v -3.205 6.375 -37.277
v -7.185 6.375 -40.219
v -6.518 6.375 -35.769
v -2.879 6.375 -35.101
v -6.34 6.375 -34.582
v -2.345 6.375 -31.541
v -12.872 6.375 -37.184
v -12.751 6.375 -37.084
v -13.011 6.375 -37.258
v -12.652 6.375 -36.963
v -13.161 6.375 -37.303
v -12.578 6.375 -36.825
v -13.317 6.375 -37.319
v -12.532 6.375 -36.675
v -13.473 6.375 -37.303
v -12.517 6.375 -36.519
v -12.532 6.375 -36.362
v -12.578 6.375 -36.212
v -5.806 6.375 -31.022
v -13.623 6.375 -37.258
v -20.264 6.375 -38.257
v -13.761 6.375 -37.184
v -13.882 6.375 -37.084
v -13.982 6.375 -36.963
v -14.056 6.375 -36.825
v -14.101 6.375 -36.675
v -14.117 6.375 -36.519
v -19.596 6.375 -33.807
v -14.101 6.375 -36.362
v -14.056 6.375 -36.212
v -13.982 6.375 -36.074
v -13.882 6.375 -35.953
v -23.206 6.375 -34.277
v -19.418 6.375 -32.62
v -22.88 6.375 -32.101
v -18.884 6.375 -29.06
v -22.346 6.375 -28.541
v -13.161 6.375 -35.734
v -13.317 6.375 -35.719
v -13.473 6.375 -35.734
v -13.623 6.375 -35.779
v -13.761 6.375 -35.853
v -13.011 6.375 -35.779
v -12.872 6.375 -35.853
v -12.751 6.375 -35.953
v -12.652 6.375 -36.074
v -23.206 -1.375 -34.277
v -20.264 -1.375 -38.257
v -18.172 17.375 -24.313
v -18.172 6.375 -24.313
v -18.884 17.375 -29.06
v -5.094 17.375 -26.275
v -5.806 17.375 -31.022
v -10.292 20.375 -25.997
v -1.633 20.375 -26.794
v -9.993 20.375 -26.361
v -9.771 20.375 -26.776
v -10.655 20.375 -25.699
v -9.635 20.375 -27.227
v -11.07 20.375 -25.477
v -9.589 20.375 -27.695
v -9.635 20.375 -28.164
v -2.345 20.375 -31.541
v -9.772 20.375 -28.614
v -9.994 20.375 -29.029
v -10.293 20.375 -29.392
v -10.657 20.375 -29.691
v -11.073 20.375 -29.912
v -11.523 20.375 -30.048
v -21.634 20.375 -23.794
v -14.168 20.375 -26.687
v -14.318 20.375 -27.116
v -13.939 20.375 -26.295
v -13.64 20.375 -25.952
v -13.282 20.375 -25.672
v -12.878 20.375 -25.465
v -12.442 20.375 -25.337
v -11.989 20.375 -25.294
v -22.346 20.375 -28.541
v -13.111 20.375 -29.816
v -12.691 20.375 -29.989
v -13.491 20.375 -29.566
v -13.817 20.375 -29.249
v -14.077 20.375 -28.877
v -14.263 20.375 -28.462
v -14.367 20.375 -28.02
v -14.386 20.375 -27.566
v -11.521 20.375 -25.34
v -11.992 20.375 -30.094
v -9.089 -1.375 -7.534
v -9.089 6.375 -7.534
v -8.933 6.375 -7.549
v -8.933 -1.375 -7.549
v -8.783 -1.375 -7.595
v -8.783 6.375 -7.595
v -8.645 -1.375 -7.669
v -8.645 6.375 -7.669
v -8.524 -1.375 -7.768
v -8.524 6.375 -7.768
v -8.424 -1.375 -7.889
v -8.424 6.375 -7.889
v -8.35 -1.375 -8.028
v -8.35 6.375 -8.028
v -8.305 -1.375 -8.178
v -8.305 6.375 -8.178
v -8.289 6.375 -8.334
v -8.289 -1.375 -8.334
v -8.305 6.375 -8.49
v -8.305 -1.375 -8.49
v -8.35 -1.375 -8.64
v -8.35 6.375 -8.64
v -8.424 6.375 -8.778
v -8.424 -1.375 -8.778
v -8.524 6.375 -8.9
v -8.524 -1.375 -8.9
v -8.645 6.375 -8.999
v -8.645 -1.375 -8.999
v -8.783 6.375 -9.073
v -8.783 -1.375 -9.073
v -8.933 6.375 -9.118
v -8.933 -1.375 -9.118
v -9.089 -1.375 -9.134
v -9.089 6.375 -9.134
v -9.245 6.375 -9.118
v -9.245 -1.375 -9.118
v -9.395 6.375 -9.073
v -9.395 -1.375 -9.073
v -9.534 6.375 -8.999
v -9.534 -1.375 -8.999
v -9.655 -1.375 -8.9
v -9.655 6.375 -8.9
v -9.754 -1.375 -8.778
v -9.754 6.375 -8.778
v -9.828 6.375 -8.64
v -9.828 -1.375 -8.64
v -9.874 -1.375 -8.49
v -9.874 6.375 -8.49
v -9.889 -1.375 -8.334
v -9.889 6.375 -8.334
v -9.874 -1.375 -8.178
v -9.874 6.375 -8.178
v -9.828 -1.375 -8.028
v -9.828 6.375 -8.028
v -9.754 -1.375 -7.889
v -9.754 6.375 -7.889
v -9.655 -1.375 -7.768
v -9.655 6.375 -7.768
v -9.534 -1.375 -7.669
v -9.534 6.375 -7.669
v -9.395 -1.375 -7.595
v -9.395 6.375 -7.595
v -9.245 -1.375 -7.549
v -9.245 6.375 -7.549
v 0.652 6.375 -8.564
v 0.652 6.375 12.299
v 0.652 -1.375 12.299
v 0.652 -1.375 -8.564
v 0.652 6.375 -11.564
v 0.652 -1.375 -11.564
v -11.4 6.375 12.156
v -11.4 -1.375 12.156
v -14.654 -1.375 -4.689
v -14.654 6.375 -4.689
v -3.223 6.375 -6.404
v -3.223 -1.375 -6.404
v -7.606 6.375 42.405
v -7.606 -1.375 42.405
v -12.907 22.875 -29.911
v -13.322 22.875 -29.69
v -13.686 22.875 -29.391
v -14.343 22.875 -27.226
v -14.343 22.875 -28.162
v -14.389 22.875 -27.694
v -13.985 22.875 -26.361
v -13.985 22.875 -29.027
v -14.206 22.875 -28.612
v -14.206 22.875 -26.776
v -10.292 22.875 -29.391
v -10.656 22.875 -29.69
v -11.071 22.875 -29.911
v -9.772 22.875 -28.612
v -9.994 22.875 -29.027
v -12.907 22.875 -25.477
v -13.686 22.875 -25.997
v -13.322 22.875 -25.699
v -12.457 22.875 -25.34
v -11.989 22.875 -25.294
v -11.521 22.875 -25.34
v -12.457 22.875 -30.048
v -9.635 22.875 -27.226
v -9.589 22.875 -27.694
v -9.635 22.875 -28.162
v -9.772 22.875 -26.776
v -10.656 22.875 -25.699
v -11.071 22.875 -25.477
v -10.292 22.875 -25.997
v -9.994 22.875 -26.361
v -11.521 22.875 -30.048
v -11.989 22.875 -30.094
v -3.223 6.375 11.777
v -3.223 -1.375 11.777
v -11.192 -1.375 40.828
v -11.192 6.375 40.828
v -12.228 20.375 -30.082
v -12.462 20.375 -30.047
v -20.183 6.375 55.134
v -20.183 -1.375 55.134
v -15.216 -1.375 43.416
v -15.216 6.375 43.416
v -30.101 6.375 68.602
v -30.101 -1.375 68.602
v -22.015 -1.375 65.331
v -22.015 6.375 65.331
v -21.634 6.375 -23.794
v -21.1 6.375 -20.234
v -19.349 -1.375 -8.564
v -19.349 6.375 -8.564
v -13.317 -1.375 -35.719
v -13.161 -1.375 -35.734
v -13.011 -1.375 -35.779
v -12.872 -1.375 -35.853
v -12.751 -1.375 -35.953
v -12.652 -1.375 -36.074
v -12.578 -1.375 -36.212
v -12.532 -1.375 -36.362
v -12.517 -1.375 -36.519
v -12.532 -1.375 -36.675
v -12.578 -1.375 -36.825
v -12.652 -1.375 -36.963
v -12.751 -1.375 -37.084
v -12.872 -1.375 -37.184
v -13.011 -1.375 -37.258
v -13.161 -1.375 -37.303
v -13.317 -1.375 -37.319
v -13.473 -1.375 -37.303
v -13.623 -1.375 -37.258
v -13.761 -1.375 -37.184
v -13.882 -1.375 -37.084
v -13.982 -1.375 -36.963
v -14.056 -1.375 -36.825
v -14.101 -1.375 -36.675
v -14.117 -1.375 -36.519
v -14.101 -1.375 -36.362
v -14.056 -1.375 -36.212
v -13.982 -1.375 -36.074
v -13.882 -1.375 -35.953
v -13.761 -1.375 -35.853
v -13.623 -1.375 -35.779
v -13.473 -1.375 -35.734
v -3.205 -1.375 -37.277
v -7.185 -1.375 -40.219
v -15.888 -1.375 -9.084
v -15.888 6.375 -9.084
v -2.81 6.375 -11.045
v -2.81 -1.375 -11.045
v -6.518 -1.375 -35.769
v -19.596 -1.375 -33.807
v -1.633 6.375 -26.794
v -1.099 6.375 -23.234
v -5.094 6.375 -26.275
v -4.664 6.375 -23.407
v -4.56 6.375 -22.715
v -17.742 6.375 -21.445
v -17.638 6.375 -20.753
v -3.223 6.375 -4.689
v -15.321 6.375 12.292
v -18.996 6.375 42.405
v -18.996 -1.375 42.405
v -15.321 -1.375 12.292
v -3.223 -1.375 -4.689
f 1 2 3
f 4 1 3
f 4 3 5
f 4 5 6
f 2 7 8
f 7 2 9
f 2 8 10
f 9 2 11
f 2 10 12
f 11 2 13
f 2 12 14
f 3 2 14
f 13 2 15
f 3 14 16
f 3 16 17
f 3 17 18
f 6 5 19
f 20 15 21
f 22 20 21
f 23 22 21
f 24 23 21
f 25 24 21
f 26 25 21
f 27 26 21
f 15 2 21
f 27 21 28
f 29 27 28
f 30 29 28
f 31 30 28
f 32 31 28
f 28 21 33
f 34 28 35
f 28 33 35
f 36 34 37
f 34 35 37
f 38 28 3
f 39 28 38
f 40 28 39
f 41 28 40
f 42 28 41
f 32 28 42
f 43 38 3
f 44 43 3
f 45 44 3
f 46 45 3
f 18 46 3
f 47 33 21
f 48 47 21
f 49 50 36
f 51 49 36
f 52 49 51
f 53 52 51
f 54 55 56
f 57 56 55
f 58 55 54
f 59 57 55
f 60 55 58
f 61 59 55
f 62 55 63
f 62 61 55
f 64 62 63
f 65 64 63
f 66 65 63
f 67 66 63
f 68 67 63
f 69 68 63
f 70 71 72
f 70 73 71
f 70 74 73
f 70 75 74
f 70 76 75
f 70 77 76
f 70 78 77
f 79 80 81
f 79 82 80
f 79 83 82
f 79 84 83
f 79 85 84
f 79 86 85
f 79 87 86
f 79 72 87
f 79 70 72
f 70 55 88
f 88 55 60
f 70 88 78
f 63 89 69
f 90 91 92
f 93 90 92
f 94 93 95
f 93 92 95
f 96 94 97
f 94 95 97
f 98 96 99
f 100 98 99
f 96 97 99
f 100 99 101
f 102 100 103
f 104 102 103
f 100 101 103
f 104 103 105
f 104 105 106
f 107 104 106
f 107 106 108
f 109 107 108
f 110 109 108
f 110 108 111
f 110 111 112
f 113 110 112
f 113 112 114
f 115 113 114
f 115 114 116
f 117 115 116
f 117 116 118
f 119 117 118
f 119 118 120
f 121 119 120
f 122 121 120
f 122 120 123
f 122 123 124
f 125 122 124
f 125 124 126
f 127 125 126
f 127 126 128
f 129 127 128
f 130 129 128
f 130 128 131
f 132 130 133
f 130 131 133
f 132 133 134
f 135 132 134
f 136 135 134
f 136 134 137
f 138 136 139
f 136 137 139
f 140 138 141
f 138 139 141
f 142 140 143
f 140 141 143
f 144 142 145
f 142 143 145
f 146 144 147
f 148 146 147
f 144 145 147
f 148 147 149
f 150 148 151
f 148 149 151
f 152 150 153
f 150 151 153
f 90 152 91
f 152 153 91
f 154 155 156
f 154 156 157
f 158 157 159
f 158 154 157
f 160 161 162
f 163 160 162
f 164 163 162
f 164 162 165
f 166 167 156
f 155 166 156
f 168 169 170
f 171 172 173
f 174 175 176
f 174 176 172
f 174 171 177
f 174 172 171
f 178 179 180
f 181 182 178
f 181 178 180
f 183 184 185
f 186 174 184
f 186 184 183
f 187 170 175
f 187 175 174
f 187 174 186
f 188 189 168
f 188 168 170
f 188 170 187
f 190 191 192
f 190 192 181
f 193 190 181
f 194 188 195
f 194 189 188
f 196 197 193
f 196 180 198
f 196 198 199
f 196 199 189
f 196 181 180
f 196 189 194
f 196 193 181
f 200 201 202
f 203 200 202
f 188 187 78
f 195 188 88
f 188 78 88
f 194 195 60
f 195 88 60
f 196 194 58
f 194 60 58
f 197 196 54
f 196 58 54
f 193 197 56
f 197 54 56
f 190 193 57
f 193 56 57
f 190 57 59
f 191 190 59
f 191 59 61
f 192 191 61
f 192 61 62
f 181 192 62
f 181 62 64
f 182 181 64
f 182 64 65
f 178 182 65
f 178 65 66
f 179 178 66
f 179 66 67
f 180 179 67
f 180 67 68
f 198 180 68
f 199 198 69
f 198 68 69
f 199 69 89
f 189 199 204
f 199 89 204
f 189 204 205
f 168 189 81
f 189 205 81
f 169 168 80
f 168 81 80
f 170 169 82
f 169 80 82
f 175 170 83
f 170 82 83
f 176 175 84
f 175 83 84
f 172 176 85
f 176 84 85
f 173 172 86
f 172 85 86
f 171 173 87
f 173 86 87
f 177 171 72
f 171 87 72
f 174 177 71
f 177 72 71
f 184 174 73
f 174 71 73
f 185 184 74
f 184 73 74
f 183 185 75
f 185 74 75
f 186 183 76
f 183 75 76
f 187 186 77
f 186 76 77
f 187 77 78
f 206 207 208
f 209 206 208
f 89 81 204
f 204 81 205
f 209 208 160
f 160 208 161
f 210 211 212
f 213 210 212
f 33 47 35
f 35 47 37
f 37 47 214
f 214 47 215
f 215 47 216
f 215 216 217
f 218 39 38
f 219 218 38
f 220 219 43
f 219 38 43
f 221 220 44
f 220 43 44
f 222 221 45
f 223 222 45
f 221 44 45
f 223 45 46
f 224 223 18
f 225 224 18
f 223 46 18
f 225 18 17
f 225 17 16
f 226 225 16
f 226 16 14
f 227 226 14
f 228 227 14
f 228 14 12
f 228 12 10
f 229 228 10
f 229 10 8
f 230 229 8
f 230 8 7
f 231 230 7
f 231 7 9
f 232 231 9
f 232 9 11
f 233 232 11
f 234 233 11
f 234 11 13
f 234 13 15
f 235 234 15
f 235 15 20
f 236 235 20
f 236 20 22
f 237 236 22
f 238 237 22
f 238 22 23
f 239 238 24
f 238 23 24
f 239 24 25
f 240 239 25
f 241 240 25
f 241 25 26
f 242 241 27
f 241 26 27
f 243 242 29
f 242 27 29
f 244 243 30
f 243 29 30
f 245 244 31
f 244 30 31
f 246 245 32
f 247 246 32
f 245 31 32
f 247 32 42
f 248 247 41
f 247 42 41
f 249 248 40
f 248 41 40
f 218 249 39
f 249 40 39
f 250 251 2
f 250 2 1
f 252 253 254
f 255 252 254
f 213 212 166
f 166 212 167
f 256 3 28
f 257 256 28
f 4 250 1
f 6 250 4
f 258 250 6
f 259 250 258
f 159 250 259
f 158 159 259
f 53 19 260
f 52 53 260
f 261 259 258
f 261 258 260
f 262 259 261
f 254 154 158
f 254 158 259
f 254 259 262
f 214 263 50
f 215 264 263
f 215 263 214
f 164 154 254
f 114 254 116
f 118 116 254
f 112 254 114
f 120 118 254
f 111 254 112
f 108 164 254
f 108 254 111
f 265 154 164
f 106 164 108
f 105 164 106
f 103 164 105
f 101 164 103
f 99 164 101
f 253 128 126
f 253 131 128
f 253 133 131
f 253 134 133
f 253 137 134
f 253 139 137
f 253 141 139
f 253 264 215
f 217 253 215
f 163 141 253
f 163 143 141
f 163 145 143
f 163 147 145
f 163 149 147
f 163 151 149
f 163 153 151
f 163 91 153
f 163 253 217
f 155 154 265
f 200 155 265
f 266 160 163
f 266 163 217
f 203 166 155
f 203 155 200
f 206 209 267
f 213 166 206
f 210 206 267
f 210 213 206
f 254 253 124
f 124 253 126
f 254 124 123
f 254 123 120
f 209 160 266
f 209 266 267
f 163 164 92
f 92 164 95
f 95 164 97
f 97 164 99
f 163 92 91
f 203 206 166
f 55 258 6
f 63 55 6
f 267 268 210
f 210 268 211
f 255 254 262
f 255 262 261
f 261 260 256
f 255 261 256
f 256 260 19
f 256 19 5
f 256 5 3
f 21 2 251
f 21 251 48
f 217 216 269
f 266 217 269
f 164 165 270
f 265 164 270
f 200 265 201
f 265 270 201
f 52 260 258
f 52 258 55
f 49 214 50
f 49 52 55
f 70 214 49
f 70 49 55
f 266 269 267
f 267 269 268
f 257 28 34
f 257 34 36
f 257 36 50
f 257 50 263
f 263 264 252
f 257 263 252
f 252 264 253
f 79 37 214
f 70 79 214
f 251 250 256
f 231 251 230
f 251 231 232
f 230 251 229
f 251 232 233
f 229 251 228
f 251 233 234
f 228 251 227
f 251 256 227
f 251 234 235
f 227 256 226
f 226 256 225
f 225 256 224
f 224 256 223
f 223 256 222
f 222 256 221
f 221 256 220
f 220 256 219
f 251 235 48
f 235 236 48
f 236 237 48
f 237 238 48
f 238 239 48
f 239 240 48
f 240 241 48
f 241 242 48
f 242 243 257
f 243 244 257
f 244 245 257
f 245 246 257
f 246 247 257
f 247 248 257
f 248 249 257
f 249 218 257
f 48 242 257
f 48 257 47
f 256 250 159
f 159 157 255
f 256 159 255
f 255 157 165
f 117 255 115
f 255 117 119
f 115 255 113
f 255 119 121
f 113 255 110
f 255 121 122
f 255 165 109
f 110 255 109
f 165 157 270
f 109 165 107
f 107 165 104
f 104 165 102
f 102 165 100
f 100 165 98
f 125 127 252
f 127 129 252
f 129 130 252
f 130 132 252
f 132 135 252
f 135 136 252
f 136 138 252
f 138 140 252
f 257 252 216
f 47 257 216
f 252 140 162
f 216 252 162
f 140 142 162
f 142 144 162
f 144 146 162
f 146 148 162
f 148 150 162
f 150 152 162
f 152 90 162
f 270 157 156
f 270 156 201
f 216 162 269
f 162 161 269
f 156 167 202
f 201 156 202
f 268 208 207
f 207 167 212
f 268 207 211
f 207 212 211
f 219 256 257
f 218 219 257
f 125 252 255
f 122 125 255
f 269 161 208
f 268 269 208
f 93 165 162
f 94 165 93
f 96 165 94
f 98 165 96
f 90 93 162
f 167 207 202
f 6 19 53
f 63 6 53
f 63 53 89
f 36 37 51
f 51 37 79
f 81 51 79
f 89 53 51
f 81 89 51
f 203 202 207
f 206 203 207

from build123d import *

# Parameters (mm, degrees)
BOSS_EXTRUDE1_DEPTH = 5
SCALE2_SCALE        = 1.55
CUT_EXTRUDE1_DEPTH  = 12.4
BOSS_EXTRUDE3_DEPTH = 7.75
SKETCH9_W           = 20.224703408
SKETCH9_H           = 7.75
BOSS_EXTRUDE4_DEPTH = 29.5
CUT_EXTRUDE2_DEPTH  = 12.4
CHAMFER1_SIZE       = 3.5
CHAMFER2_SIZE       = 3.5
SKETCH11_R          = 0.8
CUT_EXTRUDE3_DEPTH  = 12.4
SKETCH12_R          = 0.8
CUT_EXTRUDE4_DEPTH  = 12.4
BOSS_EXTRUDE5_DEPTH = 14
SKETCH18_W          = 12
SKETCH18_H          = 3
BOSS_EXTRUDE6_DEPTH = 14
SKETCH19_R          = 2.4
BOSS_EXTRUDE7_DEPTH = 2.5
SKETCH22_W          = 3.6
SKETCH22_H          = 14
CUT_EXTRUDE5_DEPTH  = 21


with BuildPart() as part:
    # Sketch2 → Boss-Extrude1 (new body)
    with BuildSketch(Plane(origin=(0, 0, 0), x_dir=(1, 0, 0), z_dir=(0, 1, 0))):
        Polygon((-16.722011876, -36.89474357), (-23.886628792, -53.795891167), (-18.669768773, -51.685253144), (-9.373686833, -36.89474357), (-4.046151178, -17.471336145), (-4.046151178, -4.010989005), (-16.95, -4.010989005), (-14.350773449, -17.46691156), align=None)
        Polygon((-13.920870812, -6.510989005), (-6.546151178, -6.510989005), (-6.546151178, -17.13469746), (-11.686920269, -35.877181599), (-17.487790608, -45.106642876), (-14.283033348, -37.546702673), (-11.821510253, -17.379157883), align=None, mode=Mode.SUBTRACT)
    extrude(amount=BOSS_EXTRUDE1_DEPTH)


with BuildPart() as part_1:
    # Scale2: scaled about (-12.587588719, 2.5, 26.875435477)
    add(part.part.scale(SCALE2_SCALE).moved(Location((6.923173795, -1.375, -14.781489512))))

    # Sketch6 → Cut-Extrude1 (cut)
    with BuildSketch(Plane(origin=(0, 6.375, 0), x_dir=(1, 0, 0), z_dir=(0, 1, 0))):
        Polygon((-3.22336053, 6.403996086), (-14.654175964, 4.689456555), (-3.22336053, 4.689456555), align=None)
    extrude(amount=-CUT_EXTRUDE1_DEPTH, mode=Mode.SUBTRACT)

    # Sketch7 → Boss-Extrude3 (add)
    with BuildSketch(Plane(origin=(0, 6.375, 0), x_dir=(1, 0, 0), z_dir=(0, 1, 0))):
        Polygon((-19.349326204, 8.564456555), (0.65163947, 8.564456555), (0.65163947, 11.564456555), align=None)
    extrude(amount=-BOSS_EXTRUDE3_DEPTH)

    # Sketch9 → Boss-Extrude4 (add)
    with BuildSketch(Plane(origin=(-1.682081089, 0, -11.214415372), x_dir=(-0.9889374035171397, 0, 0.1483334484355372), z_dir=(-0.14833344843553717, 0, -0.9889374035171395))):
        with Locations((7.752525338, 2.5)):
            Rectangle(SKETCH9_W, SKETCH9_H)
    extrude(amount=BOSS_EXTRUDE4_DEPTH)

    # Sketch10 → Cut-Extrude2 (cut)
    with BuildSketch(Plane(origin=(0, 6.375, 0), x_dir=(1, 0, 0), z_dir=(0, 1, 0))):
        Polygon((-6.517977653, 35.768724573), (-19.596381503, 33.807058712), (-15.888045292, 9.083623624), (-2.809641442, 11.045289485), align=None)
    extrude(amount=-CUT_EXTRUDE2_DEPTH, mode=Mode.SUBTRACT)

    # Chamfer1
    chamfer1_edges = [part_1.edges().sort_by_distance(p)[0] for p in [
        (-23.725162933, 2.5, -37.738109959),
    ]]
    chamfer(chamfer1_edges, length=CHAMFER1_SIZE)

    # Chamfer2
    chamfer2_edges = [part_1.edges().sort_by_distance(p)[0] for p in [
        (-3.724197259, 2.5, -40.738109959),
    ]]
    chamfer(chamfer2_edges, length=CHAMFER2_SIZE)

    # Sketch11 → Cut-Extrude3 (cut)
    with BuildSketch(Plane(origin=(0, 6.375, 0), x_dir=(1, 0, 0), z_dir=(0, 1, 0))):
        with Locations((-13.316763113, 36.518532099)):
            Circle(SKETCH11_R)
    extrude(amount=-CUT_EXTRUDE3_DEPTH, mode=Mode.SUBTRACT)

    # Sketch12 → Cut-Extrude4 (cut)
    with BuildSketch(Plane(origin=(0, 6.375, 0), x_dir=(1, 0, 0), z_dir=(0, 1, 0))):
        with Locations((-9.089259832, 8.333816099)):
            Circle(SKETCH12_R)
    extrude(amount=-CUT_EXTRUDE4_DEPTH, mode=Mode.SUBTRACT)

    # Sketch17 → Boss-Extrude5 (add)
    with BuildSketch(Plane(origin=(0, 6.375, 0), x_dir=(1, 0, 0), z_dir=(0, 1, 0))):
        Polygon((-17.638379984, 20.753084986), (-19.418381365, 32.620333828), (-22.879662277, 32.101166759), (-21.099660896, 20.233917916), align=None)
        Polygon((-2.878696603, 35.101166759), (-6.339977515, 34.581999689), (-4.559976134, 22.714750847), (-1.098695221, 23.233917916), align=None)
    extrude(amount=BOSS_EXTRUDE5_DEPTH)

    # Sketch18 → Boss-Extrude6 (add)
    with BuildSketch(Plane(origin=(-14.205964203, 0, 2.130791748), x_dir=(-0.1483334484355373, 0, -0.9889374035171397), z_dir=(0.9889374035171395, 0, -0.14833344843553728))):
        with Locations((29.139863709, 18.875)):
            Rectangle(SKETCH18_W, SKETCH18_H)
    extrude(amount=BOSS_EXTRUDE6_DEPTH)

    # Sketch19 → Boss-Extrude7 (add)
    with BuildSketch(Plane(origin=(0, 20.375, 0), x_dir=(1, 0, 0), z_dir=(0, 1, 0))):
        with Locations((-11.989048632, 27.694039925)):
            Circle(SKETCH19_R)
    extrude(amount=BOSS_EXTRUDE7_DEPTH)

    # Sketch22 → Cut-Extrude5 (cut)
    with BuildSketch(Plane(origin=(-17.667245116, 0, 2.649958817), x_dir=(0.1483334484355372, 0, 0.9889374035171397), z_dir=(-0.9889374035171395, 0, 0.14833344843553717))):
        with Locations((-24.939863709, 13.375)):
            Rectangle(SKETCH22_W, SKETCH22_H)
        with Locations((-33.339863709, 13.375)):
            Rectangle(SKETCH22_W, SKETCH22_H)
    extrude(amount=-CUT_EXTRUDE5_DEPTH, mode=Mode.SUBTRACT)


solid = part_1.part
